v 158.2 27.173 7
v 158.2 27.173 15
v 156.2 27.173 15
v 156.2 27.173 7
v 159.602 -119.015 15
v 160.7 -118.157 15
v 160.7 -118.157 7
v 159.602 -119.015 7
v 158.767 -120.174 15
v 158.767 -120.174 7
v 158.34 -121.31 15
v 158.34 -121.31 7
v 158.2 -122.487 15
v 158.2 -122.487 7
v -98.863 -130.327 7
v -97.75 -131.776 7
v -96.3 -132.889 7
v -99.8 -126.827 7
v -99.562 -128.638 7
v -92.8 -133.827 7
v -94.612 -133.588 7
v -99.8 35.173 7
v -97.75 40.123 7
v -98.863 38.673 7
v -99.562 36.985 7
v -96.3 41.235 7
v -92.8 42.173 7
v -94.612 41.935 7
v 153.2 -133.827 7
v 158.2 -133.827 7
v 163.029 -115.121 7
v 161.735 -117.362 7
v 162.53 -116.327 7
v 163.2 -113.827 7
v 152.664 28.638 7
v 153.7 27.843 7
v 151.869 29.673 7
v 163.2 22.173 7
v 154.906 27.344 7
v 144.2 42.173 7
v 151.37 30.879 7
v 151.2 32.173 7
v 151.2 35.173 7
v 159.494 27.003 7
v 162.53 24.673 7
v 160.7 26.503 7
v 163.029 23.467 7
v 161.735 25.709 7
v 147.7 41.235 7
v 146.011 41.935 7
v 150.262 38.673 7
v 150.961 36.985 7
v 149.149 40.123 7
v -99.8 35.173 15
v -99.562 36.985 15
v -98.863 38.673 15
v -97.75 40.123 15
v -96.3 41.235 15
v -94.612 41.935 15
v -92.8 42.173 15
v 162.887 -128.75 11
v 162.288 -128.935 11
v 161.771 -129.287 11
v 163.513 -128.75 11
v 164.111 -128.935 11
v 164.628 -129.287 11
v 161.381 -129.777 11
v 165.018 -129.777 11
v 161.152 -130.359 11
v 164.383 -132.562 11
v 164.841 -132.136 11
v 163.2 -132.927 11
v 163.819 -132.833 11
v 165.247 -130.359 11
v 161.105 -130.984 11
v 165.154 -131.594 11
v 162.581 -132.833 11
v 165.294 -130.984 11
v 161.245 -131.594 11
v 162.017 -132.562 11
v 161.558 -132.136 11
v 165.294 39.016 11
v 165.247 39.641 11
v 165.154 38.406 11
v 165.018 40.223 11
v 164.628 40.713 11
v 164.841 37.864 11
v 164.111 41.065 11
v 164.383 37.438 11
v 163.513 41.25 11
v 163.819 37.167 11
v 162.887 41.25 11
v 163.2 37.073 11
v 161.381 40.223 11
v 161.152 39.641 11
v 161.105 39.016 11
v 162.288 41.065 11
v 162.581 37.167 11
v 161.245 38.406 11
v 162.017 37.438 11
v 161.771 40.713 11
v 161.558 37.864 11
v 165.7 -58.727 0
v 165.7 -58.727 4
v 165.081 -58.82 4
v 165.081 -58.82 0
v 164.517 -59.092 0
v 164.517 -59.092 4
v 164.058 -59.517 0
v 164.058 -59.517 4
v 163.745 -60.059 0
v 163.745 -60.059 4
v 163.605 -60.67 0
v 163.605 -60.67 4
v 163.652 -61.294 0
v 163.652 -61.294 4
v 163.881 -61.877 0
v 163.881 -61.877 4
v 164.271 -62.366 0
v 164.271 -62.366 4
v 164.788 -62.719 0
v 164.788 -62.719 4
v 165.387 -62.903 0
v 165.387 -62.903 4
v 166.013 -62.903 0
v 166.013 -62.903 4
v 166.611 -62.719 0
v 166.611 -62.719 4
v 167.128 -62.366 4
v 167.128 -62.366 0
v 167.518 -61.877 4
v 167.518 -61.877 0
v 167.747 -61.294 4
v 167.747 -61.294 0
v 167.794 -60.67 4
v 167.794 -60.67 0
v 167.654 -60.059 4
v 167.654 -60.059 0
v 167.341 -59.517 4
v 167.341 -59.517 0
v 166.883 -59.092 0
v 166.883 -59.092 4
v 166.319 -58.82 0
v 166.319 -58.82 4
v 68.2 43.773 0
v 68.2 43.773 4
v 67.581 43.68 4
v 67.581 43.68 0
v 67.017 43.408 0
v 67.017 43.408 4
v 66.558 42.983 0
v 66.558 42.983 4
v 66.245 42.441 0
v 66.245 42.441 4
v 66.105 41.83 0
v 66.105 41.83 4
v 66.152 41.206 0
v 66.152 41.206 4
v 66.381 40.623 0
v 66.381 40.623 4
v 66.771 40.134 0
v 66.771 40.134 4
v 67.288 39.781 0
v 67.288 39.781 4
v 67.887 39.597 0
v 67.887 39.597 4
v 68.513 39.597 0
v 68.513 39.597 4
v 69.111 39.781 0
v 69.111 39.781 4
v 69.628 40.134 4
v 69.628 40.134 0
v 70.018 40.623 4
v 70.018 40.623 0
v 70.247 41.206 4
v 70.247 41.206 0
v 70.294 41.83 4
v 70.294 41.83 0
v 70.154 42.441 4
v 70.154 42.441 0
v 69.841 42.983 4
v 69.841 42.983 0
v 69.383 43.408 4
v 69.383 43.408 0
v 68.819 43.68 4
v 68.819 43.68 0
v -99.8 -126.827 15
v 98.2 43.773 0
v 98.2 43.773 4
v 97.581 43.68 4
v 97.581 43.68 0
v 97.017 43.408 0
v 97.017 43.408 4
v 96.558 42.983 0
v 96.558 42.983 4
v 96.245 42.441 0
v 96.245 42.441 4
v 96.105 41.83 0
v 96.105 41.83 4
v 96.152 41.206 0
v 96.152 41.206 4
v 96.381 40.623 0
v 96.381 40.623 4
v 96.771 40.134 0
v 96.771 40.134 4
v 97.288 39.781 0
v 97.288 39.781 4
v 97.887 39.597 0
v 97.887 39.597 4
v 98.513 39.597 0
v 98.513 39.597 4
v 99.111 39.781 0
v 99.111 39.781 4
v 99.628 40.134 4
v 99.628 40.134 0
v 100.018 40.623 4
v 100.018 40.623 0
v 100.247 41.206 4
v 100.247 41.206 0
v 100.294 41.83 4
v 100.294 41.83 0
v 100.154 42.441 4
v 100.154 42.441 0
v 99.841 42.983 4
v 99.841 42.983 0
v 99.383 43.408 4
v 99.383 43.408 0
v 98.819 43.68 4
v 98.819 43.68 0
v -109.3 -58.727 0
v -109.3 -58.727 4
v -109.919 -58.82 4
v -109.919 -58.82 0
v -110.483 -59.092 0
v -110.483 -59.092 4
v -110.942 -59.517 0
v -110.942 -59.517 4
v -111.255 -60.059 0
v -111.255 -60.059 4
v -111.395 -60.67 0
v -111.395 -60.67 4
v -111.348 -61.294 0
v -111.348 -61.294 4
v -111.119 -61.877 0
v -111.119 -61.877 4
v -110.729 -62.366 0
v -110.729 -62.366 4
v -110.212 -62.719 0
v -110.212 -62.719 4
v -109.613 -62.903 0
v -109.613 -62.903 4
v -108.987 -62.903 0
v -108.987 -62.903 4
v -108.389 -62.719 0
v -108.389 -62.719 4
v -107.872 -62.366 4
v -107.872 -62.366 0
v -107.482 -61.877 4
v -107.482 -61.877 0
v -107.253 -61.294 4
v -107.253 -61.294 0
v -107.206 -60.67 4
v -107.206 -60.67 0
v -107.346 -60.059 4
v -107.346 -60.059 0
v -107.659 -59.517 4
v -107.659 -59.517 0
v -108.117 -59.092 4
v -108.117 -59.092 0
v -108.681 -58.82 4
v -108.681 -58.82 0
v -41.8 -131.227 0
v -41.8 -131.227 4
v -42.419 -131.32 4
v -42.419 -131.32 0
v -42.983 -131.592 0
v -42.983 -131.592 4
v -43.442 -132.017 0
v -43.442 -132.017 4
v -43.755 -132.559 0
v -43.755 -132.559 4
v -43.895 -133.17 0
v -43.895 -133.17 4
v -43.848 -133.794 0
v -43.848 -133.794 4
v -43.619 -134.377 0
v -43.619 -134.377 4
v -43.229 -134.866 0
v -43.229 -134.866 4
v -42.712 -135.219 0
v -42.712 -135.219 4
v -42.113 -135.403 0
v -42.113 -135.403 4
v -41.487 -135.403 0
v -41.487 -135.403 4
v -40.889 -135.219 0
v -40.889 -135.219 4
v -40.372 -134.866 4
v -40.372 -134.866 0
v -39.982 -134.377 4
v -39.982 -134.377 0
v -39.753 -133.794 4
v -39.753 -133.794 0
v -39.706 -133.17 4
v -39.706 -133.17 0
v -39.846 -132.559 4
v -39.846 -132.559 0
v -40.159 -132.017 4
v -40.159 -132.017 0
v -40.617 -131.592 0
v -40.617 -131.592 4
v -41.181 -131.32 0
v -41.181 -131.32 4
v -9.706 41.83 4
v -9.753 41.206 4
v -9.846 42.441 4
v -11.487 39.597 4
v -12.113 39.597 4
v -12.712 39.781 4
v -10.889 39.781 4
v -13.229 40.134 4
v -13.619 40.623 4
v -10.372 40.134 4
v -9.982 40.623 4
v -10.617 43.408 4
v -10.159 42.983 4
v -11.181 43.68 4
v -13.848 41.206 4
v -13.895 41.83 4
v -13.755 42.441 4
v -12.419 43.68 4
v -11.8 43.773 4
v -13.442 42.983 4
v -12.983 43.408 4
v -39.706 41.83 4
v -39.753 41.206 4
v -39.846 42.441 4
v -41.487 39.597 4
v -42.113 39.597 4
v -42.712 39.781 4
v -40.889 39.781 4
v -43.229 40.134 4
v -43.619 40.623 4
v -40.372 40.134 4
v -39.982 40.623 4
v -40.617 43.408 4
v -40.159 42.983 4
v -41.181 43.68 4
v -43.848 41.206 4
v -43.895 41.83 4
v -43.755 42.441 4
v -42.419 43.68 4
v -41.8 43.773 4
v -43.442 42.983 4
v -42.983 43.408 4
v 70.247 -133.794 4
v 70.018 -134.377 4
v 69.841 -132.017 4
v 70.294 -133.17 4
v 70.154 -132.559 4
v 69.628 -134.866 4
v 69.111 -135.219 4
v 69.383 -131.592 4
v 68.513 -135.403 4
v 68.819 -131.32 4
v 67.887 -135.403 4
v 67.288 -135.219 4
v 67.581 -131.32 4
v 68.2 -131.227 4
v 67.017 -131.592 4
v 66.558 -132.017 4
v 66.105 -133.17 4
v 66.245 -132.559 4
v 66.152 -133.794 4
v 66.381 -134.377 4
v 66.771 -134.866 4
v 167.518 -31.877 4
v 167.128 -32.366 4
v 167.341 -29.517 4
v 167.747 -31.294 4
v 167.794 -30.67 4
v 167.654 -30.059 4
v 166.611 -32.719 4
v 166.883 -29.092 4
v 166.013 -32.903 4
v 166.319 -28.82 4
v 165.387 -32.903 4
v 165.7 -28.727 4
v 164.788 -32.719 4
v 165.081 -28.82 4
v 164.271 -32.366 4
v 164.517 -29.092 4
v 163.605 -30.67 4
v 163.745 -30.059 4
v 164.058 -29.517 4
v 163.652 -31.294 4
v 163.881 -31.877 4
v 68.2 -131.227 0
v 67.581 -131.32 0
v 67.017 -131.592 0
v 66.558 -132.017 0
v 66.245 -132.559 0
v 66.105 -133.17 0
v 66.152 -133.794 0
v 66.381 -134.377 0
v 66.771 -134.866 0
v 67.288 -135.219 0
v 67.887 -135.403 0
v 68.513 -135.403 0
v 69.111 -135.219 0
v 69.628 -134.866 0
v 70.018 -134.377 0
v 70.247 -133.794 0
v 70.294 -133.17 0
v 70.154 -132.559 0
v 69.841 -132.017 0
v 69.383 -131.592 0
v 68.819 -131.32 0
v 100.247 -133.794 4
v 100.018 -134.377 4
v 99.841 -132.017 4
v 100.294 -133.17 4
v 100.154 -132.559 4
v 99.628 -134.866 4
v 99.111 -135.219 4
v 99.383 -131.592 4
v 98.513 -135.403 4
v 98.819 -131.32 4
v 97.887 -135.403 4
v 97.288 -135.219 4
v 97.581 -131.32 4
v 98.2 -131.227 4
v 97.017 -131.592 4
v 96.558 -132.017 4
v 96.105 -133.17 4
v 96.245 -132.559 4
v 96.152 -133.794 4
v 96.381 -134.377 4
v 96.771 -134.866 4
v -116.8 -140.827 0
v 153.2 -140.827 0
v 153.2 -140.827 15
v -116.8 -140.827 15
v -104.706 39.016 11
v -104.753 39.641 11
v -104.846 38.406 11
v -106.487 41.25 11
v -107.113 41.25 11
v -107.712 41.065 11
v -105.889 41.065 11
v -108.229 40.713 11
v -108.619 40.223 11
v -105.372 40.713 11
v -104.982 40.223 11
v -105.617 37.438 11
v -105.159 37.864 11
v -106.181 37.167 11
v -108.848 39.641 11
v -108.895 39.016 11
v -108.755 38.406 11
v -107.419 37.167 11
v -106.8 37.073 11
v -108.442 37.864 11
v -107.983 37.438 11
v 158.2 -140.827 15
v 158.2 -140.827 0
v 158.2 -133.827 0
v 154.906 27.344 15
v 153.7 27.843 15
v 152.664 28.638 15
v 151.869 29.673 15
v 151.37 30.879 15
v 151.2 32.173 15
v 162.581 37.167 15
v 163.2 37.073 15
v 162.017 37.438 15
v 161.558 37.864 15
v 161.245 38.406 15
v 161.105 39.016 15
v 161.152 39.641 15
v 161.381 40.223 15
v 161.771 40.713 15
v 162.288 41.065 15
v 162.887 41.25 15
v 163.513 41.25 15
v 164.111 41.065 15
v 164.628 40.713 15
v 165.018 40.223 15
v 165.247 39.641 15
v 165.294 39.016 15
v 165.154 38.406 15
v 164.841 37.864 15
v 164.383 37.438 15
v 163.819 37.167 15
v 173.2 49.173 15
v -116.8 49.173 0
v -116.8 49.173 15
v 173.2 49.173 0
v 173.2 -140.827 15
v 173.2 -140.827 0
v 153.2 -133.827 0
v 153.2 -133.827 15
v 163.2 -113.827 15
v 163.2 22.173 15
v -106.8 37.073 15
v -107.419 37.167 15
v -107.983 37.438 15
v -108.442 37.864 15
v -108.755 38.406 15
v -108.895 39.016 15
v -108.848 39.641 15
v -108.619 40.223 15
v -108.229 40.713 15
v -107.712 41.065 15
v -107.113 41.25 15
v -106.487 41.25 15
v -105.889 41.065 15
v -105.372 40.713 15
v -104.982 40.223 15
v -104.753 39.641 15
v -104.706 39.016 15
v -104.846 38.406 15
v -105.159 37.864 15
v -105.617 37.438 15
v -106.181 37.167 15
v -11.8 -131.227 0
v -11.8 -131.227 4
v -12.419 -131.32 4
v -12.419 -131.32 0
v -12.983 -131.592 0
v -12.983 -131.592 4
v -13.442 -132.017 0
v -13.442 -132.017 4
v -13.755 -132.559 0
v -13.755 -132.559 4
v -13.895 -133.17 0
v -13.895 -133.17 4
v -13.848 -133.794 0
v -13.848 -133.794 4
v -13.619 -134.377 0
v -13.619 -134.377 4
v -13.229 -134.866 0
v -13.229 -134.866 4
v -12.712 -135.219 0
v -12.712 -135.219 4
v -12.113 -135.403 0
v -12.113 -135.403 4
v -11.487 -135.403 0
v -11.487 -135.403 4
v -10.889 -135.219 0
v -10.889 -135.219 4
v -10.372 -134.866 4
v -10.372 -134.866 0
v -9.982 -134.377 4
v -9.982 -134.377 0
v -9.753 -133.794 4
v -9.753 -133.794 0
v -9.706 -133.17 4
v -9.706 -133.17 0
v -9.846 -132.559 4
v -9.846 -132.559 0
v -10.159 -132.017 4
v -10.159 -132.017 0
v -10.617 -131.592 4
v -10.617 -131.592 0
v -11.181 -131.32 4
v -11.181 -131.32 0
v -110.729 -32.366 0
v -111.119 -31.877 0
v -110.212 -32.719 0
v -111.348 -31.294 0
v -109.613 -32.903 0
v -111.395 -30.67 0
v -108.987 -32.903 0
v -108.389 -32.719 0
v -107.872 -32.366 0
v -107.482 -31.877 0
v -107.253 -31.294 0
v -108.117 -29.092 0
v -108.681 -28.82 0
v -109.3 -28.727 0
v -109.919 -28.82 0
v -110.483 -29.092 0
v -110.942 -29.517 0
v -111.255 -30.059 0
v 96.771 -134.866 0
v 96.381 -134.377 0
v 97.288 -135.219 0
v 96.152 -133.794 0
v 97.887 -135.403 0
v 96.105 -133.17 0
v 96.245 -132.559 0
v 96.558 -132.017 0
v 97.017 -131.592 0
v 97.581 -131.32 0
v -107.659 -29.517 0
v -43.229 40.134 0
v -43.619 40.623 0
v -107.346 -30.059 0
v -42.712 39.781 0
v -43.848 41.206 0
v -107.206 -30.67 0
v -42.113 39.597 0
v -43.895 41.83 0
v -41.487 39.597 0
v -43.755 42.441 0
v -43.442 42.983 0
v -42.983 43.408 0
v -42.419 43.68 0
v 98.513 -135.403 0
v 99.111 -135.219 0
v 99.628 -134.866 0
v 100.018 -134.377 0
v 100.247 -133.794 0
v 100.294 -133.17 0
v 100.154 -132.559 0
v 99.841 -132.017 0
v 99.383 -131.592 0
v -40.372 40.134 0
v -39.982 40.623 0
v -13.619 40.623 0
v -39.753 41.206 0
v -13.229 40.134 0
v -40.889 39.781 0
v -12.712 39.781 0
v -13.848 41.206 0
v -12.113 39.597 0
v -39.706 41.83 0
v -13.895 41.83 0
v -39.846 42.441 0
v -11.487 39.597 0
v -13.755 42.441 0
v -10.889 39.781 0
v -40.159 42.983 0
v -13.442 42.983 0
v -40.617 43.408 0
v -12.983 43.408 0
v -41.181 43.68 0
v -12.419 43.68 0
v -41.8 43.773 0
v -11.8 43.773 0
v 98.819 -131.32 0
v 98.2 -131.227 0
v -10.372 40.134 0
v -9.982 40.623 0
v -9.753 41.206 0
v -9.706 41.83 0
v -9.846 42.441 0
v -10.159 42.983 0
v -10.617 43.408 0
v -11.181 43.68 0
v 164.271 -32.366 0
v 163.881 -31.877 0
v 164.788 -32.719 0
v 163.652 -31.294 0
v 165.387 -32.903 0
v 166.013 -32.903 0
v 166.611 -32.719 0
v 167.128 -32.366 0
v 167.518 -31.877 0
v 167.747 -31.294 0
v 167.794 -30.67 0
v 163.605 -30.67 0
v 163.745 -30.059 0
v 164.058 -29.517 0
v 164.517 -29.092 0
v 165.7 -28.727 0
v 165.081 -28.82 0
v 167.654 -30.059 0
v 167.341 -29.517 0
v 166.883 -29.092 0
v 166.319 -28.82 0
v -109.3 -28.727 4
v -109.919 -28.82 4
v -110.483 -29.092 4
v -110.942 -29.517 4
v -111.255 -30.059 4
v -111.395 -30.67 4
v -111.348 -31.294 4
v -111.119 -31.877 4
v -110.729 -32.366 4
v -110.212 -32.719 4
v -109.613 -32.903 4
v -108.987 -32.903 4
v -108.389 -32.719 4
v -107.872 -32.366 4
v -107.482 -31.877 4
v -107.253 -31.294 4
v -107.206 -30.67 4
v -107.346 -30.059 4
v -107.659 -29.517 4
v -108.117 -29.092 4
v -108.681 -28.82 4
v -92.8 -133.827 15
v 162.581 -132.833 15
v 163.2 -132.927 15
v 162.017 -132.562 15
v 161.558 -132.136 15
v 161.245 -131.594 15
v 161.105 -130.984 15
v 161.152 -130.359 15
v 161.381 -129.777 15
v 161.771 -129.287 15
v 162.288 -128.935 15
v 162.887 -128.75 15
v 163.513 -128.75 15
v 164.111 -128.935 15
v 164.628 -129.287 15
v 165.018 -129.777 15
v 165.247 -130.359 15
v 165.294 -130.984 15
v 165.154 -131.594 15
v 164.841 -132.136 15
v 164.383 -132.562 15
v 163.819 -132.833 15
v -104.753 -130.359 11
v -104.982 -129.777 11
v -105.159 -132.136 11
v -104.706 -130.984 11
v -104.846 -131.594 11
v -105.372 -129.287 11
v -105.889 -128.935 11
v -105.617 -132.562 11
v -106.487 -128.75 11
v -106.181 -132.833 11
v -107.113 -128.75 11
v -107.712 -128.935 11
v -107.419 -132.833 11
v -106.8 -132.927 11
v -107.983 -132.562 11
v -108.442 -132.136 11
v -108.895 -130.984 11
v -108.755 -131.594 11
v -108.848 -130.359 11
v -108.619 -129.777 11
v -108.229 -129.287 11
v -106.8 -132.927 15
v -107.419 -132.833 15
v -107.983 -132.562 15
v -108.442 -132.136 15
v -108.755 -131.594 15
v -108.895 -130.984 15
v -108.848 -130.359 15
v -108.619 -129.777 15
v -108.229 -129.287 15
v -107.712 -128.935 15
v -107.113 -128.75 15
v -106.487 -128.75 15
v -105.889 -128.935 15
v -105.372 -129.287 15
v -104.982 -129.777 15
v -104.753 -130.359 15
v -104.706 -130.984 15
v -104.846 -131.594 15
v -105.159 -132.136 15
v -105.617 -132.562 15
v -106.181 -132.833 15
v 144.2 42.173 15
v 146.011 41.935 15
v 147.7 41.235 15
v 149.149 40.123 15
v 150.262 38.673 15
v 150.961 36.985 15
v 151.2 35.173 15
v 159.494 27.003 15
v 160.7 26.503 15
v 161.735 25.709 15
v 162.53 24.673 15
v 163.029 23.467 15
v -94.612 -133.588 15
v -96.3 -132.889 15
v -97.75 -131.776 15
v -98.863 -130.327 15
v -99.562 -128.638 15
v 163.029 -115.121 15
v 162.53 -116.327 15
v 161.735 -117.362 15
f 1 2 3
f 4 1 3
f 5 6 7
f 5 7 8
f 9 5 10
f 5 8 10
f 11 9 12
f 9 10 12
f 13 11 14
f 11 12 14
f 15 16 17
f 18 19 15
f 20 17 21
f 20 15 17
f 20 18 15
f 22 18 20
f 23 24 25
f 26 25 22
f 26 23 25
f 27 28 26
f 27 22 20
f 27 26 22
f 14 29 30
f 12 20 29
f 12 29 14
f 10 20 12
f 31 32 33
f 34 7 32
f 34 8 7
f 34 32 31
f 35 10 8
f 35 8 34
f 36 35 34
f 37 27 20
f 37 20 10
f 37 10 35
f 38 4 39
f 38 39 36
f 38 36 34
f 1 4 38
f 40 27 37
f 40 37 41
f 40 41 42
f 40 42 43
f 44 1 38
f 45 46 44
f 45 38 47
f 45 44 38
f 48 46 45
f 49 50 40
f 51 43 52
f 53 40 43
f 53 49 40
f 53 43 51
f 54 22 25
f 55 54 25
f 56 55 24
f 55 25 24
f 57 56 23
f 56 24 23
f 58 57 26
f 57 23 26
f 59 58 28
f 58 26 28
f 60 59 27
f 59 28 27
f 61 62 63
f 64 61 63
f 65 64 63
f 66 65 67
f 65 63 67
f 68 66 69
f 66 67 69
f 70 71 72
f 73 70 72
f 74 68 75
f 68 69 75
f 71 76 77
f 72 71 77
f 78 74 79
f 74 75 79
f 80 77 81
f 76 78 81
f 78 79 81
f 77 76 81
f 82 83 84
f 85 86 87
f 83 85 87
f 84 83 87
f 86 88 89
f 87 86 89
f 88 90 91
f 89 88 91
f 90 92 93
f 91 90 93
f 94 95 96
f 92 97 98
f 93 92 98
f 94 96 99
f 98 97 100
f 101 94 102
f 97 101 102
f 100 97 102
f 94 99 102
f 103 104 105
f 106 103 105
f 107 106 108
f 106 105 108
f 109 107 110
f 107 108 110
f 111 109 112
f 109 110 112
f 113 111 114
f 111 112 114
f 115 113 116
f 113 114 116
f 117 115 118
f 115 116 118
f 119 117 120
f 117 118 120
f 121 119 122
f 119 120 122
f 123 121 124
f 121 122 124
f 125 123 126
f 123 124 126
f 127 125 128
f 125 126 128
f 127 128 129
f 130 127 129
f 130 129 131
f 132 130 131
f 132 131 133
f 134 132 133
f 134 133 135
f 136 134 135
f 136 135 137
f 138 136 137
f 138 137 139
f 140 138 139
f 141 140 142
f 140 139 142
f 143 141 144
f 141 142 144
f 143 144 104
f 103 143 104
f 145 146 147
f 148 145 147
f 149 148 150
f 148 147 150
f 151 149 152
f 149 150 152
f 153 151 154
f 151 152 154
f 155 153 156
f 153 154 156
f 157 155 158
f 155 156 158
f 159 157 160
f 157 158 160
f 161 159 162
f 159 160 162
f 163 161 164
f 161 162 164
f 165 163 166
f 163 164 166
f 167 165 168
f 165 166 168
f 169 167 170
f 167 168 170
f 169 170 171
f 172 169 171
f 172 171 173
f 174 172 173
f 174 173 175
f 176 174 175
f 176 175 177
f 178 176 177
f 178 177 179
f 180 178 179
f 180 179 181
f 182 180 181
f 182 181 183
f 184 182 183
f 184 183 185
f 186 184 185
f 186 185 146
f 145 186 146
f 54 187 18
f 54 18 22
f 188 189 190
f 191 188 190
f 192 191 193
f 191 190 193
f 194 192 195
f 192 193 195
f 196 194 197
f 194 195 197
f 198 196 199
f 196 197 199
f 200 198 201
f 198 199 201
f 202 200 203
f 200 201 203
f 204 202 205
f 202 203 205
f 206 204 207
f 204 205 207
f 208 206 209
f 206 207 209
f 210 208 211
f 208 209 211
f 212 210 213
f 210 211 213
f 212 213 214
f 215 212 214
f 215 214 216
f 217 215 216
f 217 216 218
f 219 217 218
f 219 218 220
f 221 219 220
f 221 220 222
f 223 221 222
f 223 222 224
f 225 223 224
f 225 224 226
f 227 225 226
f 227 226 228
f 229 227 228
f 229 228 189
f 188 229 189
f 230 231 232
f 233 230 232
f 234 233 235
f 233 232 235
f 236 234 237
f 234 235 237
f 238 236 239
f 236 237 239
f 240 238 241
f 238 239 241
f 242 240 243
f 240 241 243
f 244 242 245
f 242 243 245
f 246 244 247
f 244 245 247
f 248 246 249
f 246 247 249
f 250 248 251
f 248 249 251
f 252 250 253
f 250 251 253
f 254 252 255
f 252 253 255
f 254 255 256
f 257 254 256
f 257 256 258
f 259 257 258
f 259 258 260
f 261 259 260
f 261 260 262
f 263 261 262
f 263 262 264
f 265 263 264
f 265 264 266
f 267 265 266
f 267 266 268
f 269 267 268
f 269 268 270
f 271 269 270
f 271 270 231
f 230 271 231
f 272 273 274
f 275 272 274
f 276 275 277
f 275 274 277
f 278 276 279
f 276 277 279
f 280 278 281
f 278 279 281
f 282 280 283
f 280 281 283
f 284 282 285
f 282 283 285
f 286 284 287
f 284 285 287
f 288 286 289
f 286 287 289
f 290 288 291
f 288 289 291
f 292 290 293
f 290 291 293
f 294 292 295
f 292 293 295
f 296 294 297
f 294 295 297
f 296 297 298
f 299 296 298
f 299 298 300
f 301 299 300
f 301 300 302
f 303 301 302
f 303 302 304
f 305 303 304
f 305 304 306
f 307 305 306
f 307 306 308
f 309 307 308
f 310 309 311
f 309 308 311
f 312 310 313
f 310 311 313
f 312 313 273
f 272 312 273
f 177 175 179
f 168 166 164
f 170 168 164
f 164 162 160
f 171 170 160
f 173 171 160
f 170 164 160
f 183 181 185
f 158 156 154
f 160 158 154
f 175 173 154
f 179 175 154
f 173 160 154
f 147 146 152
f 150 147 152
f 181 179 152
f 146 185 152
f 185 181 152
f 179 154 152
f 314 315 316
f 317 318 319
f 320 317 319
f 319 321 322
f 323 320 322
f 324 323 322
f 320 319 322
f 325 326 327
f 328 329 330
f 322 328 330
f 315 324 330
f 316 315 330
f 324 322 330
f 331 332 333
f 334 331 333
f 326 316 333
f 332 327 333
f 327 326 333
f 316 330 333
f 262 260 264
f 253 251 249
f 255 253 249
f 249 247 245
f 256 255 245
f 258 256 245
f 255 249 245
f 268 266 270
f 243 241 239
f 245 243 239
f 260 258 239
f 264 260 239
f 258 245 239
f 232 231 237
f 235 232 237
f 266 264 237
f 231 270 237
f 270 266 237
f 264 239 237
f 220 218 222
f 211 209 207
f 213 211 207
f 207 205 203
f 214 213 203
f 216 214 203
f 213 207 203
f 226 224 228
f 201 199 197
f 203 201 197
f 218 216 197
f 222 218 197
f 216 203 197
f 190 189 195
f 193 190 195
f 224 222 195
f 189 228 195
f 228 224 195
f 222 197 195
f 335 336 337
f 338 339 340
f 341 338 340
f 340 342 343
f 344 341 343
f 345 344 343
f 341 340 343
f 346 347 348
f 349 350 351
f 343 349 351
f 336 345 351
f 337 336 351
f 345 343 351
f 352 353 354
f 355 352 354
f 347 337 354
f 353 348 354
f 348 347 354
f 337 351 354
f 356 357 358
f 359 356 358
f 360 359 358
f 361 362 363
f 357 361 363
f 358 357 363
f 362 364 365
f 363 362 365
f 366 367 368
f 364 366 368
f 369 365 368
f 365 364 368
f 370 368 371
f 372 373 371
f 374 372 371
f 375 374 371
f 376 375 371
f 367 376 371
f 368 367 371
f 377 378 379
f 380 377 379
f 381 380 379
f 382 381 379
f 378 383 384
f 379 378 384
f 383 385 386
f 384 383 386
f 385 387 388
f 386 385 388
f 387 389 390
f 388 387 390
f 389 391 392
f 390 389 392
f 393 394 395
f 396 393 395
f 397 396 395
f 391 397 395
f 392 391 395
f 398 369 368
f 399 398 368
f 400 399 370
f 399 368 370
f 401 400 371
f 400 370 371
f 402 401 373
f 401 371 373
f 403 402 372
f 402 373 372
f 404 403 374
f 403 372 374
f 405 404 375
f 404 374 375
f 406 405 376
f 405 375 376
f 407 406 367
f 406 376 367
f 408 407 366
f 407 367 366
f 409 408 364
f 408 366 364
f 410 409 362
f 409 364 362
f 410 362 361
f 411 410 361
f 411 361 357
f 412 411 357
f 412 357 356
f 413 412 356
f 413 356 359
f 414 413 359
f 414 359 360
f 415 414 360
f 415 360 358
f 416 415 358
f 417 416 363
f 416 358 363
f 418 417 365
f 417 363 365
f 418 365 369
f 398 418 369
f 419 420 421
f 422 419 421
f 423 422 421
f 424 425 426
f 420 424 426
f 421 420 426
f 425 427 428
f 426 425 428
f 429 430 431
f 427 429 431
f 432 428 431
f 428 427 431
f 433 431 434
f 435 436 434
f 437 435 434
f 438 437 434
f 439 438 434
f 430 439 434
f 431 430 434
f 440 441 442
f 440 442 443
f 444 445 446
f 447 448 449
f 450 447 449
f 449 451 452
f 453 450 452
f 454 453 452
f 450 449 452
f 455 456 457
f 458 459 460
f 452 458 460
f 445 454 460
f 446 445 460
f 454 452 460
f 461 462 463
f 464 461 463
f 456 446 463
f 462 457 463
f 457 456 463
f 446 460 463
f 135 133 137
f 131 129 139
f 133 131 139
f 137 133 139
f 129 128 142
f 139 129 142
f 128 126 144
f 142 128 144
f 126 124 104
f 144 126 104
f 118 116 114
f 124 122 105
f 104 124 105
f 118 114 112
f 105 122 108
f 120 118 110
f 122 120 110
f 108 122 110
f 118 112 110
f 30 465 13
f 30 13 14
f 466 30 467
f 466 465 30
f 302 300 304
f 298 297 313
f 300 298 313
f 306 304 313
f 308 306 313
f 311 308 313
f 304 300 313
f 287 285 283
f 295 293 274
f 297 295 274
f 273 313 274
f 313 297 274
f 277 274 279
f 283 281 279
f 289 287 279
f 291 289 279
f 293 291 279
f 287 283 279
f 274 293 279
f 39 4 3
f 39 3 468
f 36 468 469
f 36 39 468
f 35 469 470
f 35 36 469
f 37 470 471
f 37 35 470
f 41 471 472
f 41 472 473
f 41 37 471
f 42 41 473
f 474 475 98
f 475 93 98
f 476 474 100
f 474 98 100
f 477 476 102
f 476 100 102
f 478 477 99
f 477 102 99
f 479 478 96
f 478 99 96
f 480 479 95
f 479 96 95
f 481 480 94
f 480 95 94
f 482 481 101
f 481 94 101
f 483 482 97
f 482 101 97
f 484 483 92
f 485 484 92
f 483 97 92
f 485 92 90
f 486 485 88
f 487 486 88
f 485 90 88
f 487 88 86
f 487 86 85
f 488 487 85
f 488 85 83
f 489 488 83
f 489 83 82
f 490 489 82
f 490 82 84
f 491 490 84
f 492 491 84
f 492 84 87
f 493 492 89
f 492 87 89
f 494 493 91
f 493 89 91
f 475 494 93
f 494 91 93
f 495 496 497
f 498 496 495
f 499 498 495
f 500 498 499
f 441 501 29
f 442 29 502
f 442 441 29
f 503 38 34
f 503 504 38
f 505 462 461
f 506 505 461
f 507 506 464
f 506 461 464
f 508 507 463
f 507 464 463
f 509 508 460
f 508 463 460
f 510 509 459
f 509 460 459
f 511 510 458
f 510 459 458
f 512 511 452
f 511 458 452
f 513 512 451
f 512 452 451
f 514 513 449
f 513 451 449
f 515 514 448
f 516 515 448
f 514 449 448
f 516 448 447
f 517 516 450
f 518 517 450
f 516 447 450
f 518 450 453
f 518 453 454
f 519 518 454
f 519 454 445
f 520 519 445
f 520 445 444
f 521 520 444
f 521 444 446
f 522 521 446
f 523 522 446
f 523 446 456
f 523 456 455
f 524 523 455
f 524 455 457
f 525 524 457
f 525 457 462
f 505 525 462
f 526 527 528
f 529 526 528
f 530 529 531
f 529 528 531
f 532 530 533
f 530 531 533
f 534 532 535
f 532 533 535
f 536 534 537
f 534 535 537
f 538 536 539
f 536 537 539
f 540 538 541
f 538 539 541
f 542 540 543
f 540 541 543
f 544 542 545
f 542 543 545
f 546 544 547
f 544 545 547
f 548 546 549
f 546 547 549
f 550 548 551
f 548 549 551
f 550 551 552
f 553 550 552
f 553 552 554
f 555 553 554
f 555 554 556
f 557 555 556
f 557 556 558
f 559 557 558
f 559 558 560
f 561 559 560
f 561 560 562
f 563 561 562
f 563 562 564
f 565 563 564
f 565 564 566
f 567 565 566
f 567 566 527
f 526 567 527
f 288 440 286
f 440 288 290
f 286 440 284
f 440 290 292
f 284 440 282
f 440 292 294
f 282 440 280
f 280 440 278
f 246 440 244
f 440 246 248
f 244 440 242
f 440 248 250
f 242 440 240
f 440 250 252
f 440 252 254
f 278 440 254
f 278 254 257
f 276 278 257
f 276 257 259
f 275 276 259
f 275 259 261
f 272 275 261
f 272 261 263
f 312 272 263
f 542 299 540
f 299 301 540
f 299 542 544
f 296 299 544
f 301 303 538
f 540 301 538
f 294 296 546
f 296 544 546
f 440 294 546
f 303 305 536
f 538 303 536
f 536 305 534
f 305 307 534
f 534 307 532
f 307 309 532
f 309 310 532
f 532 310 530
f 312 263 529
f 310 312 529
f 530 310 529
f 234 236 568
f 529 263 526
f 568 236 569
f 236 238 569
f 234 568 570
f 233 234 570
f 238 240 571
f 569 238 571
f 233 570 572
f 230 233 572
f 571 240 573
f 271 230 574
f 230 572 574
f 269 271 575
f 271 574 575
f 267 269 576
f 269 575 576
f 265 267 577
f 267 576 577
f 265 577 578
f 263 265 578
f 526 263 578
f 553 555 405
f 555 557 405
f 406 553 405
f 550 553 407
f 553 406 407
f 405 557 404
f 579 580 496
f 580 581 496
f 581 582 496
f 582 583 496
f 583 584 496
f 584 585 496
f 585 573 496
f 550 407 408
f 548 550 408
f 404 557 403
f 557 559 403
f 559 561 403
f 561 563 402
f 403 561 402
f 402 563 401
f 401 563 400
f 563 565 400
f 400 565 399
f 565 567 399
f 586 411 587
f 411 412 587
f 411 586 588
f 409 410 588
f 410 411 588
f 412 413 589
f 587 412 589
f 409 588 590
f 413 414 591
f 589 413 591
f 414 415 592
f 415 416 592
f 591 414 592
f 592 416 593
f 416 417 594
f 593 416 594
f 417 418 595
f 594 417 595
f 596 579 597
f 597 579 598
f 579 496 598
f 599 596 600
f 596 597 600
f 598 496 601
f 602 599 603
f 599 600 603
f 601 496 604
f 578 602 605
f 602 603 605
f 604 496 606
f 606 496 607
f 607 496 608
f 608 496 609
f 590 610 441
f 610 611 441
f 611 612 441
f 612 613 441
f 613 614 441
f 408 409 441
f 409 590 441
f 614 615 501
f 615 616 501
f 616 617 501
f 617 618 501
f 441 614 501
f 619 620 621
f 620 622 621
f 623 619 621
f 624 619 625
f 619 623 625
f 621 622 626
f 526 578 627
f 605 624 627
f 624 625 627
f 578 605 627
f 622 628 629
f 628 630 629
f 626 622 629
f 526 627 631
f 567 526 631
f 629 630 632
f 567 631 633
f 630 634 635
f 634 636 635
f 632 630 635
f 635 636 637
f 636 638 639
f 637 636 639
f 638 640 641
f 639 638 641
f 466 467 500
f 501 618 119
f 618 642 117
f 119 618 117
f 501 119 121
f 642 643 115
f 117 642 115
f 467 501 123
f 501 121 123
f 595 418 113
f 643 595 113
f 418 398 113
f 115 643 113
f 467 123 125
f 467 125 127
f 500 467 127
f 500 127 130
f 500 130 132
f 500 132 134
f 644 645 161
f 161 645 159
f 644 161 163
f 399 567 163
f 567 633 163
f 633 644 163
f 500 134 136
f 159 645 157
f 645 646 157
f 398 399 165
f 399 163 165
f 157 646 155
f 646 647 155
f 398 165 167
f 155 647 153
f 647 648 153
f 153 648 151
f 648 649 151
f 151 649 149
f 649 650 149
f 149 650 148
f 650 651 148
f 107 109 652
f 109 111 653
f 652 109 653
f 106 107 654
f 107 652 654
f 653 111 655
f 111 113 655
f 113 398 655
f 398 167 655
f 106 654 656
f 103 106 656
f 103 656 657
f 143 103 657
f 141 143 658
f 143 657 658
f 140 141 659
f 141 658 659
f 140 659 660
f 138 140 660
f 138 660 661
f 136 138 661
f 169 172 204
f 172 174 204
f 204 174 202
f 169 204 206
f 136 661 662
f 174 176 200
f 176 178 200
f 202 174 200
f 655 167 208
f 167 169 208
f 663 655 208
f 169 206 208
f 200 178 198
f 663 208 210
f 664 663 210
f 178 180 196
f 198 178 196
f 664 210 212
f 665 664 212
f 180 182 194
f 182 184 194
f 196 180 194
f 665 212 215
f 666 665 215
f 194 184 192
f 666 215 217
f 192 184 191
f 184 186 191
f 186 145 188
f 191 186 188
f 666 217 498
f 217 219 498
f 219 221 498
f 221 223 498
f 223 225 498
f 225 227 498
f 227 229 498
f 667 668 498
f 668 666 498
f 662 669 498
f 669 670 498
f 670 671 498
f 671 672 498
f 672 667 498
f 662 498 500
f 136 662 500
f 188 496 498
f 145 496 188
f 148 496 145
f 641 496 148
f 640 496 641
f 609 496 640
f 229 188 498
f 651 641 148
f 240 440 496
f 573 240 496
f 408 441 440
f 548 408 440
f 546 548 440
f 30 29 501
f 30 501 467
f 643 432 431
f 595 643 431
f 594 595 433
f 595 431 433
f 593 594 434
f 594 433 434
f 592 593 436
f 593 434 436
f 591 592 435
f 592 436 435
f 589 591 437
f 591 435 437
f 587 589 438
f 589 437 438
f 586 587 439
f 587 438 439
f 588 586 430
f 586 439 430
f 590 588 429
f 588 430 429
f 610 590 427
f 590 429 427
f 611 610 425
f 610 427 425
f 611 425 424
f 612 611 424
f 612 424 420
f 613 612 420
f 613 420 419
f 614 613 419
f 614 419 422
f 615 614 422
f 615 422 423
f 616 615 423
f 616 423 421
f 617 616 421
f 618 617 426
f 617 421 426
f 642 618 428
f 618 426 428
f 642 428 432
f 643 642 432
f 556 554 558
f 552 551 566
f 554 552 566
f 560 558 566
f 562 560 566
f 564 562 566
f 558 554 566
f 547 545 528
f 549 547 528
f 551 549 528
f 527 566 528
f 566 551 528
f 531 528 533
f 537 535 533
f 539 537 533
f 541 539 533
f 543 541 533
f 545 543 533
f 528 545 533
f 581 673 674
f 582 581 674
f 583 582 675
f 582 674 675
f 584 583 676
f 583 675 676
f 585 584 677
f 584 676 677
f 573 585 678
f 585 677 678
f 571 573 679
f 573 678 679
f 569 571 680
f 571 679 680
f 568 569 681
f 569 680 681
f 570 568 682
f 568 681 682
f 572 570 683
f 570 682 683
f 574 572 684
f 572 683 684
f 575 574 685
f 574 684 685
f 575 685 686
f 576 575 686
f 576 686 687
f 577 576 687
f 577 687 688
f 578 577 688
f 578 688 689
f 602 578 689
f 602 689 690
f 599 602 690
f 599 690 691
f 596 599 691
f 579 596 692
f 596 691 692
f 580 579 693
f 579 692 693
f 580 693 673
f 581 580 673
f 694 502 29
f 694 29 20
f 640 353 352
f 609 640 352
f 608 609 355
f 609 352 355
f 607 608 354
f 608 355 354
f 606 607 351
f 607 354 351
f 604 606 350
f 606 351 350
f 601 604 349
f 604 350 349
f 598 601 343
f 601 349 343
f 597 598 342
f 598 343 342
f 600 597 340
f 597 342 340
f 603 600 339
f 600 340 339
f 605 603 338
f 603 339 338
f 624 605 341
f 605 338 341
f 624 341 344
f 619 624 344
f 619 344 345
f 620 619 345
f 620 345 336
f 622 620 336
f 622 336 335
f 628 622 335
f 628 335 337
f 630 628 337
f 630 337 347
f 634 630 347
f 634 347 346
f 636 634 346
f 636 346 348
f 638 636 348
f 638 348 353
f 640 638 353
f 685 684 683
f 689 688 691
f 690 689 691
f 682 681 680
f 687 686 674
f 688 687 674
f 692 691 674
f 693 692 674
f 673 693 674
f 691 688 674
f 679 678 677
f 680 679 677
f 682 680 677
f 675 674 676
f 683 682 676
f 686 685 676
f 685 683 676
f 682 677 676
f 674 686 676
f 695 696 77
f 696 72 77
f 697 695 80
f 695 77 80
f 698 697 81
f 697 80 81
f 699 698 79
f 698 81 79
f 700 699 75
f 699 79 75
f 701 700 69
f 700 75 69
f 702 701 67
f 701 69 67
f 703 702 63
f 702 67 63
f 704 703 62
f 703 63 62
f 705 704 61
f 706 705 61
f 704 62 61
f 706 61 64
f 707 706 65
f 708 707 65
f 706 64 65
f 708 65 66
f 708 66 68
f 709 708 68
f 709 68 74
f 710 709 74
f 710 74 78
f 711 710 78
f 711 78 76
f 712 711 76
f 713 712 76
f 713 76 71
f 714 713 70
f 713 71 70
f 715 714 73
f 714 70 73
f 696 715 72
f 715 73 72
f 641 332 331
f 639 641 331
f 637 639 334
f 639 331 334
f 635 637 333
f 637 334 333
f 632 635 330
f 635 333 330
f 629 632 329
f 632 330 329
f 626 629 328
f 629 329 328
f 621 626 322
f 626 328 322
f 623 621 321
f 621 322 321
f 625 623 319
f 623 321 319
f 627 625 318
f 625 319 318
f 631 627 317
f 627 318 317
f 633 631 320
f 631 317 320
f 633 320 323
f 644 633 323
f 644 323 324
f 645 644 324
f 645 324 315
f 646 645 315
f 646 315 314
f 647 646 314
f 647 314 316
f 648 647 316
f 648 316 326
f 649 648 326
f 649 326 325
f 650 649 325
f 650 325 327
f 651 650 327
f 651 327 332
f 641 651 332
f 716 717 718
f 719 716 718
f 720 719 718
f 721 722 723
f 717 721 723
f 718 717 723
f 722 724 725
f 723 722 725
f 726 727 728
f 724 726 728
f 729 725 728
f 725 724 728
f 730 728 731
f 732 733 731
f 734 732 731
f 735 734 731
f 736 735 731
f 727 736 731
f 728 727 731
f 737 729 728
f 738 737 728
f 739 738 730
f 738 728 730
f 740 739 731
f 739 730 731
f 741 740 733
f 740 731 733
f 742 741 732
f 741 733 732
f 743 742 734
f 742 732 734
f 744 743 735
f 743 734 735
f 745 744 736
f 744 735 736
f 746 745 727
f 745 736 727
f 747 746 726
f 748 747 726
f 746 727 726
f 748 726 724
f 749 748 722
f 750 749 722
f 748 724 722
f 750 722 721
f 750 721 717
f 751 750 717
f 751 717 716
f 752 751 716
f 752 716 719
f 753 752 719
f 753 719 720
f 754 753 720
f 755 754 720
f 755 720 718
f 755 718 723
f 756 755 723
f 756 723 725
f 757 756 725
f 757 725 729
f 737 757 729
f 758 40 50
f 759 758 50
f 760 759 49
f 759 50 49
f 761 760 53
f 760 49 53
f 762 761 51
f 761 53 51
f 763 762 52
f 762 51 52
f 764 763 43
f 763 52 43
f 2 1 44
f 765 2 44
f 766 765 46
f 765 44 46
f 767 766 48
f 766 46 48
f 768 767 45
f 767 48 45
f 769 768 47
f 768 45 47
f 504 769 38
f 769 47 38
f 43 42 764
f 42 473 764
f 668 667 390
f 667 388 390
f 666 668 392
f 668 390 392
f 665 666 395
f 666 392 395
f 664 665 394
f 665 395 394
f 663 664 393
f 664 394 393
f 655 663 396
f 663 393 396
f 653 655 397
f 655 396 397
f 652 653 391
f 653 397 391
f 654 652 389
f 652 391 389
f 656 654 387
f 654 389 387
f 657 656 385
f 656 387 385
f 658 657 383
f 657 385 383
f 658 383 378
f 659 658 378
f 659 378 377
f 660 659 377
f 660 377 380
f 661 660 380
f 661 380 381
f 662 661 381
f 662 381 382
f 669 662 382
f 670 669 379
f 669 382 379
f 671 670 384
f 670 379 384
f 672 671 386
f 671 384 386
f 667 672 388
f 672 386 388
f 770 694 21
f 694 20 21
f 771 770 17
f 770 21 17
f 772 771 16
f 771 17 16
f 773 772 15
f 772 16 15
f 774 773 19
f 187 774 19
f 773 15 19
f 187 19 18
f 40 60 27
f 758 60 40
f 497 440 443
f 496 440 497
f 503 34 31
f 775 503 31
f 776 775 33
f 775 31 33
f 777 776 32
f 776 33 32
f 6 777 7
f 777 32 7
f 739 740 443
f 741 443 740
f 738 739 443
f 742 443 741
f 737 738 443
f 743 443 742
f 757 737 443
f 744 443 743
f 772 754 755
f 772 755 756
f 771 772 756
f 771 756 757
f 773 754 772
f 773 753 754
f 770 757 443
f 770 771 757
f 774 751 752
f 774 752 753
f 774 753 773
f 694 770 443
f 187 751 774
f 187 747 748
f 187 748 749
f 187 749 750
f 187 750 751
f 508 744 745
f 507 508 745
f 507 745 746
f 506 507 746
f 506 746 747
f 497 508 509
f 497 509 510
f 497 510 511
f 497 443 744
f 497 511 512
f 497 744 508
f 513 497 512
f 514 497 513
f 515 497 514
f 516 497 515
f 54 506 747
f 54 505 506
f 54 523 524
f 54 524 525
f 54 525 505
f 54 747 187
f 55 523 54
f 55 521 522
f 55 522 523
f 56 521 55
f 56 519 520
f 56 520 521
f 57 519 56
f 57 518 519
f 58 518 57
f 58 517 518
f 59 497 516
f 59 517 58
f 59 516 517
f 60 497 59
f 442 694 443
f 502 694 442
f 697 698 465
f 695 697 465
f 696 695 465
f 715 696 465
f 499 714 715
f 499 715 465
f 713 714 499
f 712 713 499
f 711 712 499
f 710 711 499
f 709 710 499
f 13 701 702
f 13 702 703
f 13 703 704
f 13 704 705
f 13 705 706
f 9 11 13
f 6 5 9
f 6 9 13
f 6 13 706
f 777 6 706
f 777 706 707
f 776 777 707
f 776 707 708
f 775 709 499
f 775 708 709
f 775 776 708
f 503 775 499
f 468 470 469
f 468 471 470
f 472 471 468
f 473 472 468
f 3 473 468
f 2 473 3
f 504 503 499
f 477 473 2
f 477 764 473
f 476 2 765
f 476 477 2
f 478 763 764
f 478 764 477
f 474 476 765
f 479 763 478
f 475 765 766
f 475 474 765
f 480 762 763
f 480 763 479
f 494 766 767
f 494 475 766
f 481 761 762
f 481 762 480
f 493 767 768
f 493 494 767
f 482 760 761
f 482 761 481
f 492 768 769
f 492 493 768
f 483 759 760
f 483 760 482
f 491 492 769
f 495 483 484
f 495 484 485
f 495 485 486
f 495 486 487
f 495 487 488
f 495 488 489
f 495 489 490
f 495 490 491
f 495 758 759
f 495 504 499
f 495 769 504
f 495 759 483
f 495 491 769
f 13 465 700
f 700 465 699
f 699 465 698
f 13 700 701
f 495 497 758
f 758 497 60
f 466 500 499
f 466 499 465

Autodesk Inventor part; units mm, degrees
ref_plane "YZ Plane" through (0, 0, 0) normal (1, 0, 0) x (0, 1, 0)
sketch "スケッチ1" plane through (0, 0, 0) normal (0, 0, 1) x (1, 0, 0)
  line L0 (-116.8004, 49.1733) -> (173.1996, 49.1733)
  line L1 (173.1996, 49.1733) -> (173.1996, -140.8267)
  line L2 (173.1996, -140.8267) -> (-116.8004, -140.8267)
  line L3 (-116.8004, -140.8267) -> (-116.8004, 49.1733)
  point P0 (0, 0)
  dimension "d0" = 290
  dimension "d1" = 190
extrude "押し出し1" add sketch "スケッチ1" along normal blind 15
sketch "スケッチ2" plane through (0, 0, 15) normal (0, 0, 1) x (1, 0, 0)
  line L0 (-111.8004, 42.1733) -> (163.1996, 42.1733)
  line L1 (163.1996, 42.1733) -> (163.1996, -133.8267)
  line L2 (163.1996, -133.8267) -> (-111.8004, -133.8267)
  line L3 (-111.8004, -133.8267) -> (-111.8004, 42.1733)
  line L4 (-111.8004, 27.1733) -> (-99.8004, 27.1733)
  line L5 (-99.8004, 27.1733) -> (-99.8004, 42.1733)
  line L6 (-116.8004, 49.1733) -> (-116.8004, -140.8267) projected
  line L7 (-116.8004, -140.8267) -> (173.1996, -140.8267) projected
  line L8 (173.1996, 49.1733) -> (-116.8004, 49.1733) projected
  line L9 (28.1996, -45.8267) -> (-116.8004, -45.8267)
  line L10 (28.1996, -45.8267) -> (28.1996, 49.1733)
  line L11 (168.1996, 27.1733) -> (158.1996, 27.1733)
  line L12 (158.1996, 27.1733) -> (158.1996, 42.1733)
  line L13 (-111.8004, -118.8267) -> (-99.8004, -118.8267)
  line L14 (-99.8004, -118.8267) -> (-99.8004, -133.8267)
  line L15 (158.1996, -118.8267) -> (158.1996, -133.8267)
  line L16 (168.1996, -118.8267) -> (158.1996, -118.8267)
  line L17 (-99.8004, 27.1733) -> (-99.8004, -118.8267)
  line L18 (158.1996, 27.1733) -> (151.1996, 27.1733)
  line L19 (151.1996, 27.1733) -> (151.1996, 42.1733)
  line L20 (158.1996, -118.8267) -> (151.1996, -118.8267)
  line L21 (151.1996, -118.8267) -> (151.1996, -133.8267)
  point P0 (0, 0)
  point P1 (163.1996, -118.8267)
  point P2 (163.1996, 27.1733)
  point P3 (158.1996, 42.1733)
  point P4 (-111.8004, -118.8267)
  point P5 (158.1996, -133.8267)
  dimension "d4" = 15
  dimension "d5" = 275
  dimension "d6" = 5
  dimension "d7" = 7
  dimension "d8" = 7
  dimension "d9" = 12
  dimension "d15" = 7
ref_plane "作業平面1" through (28.1996, -140.8267, 0) normal (-1, 0, 0) x (0, 0, 1)
ref_plane "作業平面2" through (-116.8004, -45.8267, 0) normal (0, 1, 0) x (1, 0, 0)
extrude "押し出し2" cut sketch "スケッチ2" against normal blind 8 contours L0 L10 L9 L17 L5 | L0 L19 L18 L11 L1 L16 L20 L21 L2 L14 L17 L9 L10 | L21 L20 L15 L2
sketch "スケッチ3" plane through (-116.8004, -140.8267, 0) normal (0, -1, 0) x (1, 0, 0)
  line L0 (275, 15) -> (275, 7) projected
  line L1 (275, 7) -> (17, 7) projected
  line L2 (275, 7) -> (270, 7)
  line L3 (270, 7) -> (270, 15)
  line L4 (0, 15) -> (290, 15) projected
  line L5 (270, 7) -> (270, 0)
  line L6 (290, 0) -> (0, 0) projected
  line L7 (275, 15) -> (275, 7) projected
  line L8 (275, 0) -> (275, 7)
  point P0 (116.8004, 0)
  dimension "d12" = 5
extrude "押し出し3" cut sketch "スケッチ3" against normal blind 7
sketch "スケッチ4" plane through (0, 0, 15) normal (0, 0, 1) x (1, 0, 0)
  circle A0 centre (-106.8004, 39.1733) radius 2.25 projected
  circle A1 centre (163.1996, 39.1733) radius 2.25 projected
  circle A2 centre (163.1996, -130.8267) radius 2.25 projected
  line L0 (153.1996, -133.8267) -> (-99.8004, -133.8267) projected
  line L1 (-99.8004, -133.8267) -> (-99.8004, 42.1733) projected
  line L2 (-99.8004, 42.1733) -> (151.1996, 42.1733) projected
  line L3 (151.1996, 42.1733) -> (151.1996, 27.1733) projected
  line L4 (151.1996, 27.1733) -> (163.1996, 27.1733) projected
  line L5 (163.1996, 27.1733) -> (163.1996, -118.8267) projected
  line L6 (163.1996, -118.8267) -> (158.1996, -118.8267) projected
  line L7 (158.1996, -118.8267) -> (158.1996, -140.8267) projected
  line L8 (-116.8004, -140.8267) -> (153.1996, -140.8267) projected
  line L9 (173.1996, -140.8267) -> (173.1996, 49.1733) projected
  line L10 (173.1996, 49.1733) -> (-116.8004, 49.1733) projected
  line L11 (-116.8004, 49.1733) -> (-116.8004, -140.8267) projected
  line L12 (158.1996, -140.8267) -> (173.1996, -140.8267) projected
  circle A3 centre (-106.8004, -130.8267) radius 2.25 projected
  line L13 (153.1996, -140.8267) -> (153.1996, -133.8267) projected
  point P0 (0, 0)
hole "穴1" at (-106.8004, 39.1733, 15) at (-106.8004, -130.8267, 15) at (163.1996, -130.8267, 15) at (163.1996, 39.1733, 15) direction (0, 0, -1) diameter 4.2 depth 4
fillet "フィレット2" radius 7 3 edges at (-99.8004, 42.1733, 11) (-99.8004, -133.8267, 11) (151.1996, 42.1733, 11)
fillet "フィレット3" radius 5 4 edges at (151.1996, 27.1733, 11) (163.1996, 27.1733, 11) (158.1996, -118.8267, 11) (163.1996, -118.8267, 11)
sketch "スケッチ5" plane through (0, 0, 0) normal (0, 0, -1) x (-1, 0, 0)
  line L0 (-143.1996, 41.1733) -> (92.8004, 41.1733) projected
  line L1 (92.8004, -133.8267) -> (-143.1996, -133.8267) projected
  line L2 (99.8004, 34.1733) -> (99.8004, -126.8267) projected
  line L3 (-163.1996, 22.1733) -> (-163.1996, -113.8267) projected
  line L4 (-173.1996, -140.8267) -> (-173.1996, 49.1733) projected
  line L5 (-28.1996, 87.1733) -> (-28.1996, -178.8267) projected
  line L6 (-231.1996, -45.8267) -> (174.8004, -45.8267) projected
  line L7 (-173.1996, 49.1733) -> (116.8004, 49.1733) projected
  point P0 (0, 0)
  point P1 (-98.1996, 41.6733)
  point P2 (41.8004, 41.6733)
  point P3 (-98.1996, -133.3267)
  point P4 (41.8004, -133.3267)
  point P5 (-165.6996, -30.8267)
  point P6 (-165.6996, -60.8267)
  point P7 (109.3004, -30.8267)
  point P8 (109.3004, -60.8267)
  point P9 (-68.1996, 41.6733)
  point P10 (11.8004, 41.6733)
  point P11 (-68.1996, -133.3267)
  point P12 (11.8004, -133.3267)
  dimension "d26" = 75
  dimension "d27" = 7.5
  dimension "d28" = 15
  dimension "d29" = 7.5
  dimension "d30" = 30
  dimension "d31" = 7.5
hole "穴2" at (98.1996, 41.6733, 0) at (-41.8004, 41.6733, 0) at (98.1996, -133.3267, 0) at (-41.8004, -133.3267, 0) at (165.6996, -30.8267, 0) at (165.6996, -60.8267, 0) at (-109.3004, -30.8267, 0) at (-109.3004, -60.8267, 0) at (68.1996, 41.6733, 0) at (-11.8004, 41.6733, 0) at (68.1996, -133.3267, 0) at (-11.8004, -133.3267, 0) direction (0, 0, 1) diameter 4.2 depth 4
properties part number "iPadHolder"
